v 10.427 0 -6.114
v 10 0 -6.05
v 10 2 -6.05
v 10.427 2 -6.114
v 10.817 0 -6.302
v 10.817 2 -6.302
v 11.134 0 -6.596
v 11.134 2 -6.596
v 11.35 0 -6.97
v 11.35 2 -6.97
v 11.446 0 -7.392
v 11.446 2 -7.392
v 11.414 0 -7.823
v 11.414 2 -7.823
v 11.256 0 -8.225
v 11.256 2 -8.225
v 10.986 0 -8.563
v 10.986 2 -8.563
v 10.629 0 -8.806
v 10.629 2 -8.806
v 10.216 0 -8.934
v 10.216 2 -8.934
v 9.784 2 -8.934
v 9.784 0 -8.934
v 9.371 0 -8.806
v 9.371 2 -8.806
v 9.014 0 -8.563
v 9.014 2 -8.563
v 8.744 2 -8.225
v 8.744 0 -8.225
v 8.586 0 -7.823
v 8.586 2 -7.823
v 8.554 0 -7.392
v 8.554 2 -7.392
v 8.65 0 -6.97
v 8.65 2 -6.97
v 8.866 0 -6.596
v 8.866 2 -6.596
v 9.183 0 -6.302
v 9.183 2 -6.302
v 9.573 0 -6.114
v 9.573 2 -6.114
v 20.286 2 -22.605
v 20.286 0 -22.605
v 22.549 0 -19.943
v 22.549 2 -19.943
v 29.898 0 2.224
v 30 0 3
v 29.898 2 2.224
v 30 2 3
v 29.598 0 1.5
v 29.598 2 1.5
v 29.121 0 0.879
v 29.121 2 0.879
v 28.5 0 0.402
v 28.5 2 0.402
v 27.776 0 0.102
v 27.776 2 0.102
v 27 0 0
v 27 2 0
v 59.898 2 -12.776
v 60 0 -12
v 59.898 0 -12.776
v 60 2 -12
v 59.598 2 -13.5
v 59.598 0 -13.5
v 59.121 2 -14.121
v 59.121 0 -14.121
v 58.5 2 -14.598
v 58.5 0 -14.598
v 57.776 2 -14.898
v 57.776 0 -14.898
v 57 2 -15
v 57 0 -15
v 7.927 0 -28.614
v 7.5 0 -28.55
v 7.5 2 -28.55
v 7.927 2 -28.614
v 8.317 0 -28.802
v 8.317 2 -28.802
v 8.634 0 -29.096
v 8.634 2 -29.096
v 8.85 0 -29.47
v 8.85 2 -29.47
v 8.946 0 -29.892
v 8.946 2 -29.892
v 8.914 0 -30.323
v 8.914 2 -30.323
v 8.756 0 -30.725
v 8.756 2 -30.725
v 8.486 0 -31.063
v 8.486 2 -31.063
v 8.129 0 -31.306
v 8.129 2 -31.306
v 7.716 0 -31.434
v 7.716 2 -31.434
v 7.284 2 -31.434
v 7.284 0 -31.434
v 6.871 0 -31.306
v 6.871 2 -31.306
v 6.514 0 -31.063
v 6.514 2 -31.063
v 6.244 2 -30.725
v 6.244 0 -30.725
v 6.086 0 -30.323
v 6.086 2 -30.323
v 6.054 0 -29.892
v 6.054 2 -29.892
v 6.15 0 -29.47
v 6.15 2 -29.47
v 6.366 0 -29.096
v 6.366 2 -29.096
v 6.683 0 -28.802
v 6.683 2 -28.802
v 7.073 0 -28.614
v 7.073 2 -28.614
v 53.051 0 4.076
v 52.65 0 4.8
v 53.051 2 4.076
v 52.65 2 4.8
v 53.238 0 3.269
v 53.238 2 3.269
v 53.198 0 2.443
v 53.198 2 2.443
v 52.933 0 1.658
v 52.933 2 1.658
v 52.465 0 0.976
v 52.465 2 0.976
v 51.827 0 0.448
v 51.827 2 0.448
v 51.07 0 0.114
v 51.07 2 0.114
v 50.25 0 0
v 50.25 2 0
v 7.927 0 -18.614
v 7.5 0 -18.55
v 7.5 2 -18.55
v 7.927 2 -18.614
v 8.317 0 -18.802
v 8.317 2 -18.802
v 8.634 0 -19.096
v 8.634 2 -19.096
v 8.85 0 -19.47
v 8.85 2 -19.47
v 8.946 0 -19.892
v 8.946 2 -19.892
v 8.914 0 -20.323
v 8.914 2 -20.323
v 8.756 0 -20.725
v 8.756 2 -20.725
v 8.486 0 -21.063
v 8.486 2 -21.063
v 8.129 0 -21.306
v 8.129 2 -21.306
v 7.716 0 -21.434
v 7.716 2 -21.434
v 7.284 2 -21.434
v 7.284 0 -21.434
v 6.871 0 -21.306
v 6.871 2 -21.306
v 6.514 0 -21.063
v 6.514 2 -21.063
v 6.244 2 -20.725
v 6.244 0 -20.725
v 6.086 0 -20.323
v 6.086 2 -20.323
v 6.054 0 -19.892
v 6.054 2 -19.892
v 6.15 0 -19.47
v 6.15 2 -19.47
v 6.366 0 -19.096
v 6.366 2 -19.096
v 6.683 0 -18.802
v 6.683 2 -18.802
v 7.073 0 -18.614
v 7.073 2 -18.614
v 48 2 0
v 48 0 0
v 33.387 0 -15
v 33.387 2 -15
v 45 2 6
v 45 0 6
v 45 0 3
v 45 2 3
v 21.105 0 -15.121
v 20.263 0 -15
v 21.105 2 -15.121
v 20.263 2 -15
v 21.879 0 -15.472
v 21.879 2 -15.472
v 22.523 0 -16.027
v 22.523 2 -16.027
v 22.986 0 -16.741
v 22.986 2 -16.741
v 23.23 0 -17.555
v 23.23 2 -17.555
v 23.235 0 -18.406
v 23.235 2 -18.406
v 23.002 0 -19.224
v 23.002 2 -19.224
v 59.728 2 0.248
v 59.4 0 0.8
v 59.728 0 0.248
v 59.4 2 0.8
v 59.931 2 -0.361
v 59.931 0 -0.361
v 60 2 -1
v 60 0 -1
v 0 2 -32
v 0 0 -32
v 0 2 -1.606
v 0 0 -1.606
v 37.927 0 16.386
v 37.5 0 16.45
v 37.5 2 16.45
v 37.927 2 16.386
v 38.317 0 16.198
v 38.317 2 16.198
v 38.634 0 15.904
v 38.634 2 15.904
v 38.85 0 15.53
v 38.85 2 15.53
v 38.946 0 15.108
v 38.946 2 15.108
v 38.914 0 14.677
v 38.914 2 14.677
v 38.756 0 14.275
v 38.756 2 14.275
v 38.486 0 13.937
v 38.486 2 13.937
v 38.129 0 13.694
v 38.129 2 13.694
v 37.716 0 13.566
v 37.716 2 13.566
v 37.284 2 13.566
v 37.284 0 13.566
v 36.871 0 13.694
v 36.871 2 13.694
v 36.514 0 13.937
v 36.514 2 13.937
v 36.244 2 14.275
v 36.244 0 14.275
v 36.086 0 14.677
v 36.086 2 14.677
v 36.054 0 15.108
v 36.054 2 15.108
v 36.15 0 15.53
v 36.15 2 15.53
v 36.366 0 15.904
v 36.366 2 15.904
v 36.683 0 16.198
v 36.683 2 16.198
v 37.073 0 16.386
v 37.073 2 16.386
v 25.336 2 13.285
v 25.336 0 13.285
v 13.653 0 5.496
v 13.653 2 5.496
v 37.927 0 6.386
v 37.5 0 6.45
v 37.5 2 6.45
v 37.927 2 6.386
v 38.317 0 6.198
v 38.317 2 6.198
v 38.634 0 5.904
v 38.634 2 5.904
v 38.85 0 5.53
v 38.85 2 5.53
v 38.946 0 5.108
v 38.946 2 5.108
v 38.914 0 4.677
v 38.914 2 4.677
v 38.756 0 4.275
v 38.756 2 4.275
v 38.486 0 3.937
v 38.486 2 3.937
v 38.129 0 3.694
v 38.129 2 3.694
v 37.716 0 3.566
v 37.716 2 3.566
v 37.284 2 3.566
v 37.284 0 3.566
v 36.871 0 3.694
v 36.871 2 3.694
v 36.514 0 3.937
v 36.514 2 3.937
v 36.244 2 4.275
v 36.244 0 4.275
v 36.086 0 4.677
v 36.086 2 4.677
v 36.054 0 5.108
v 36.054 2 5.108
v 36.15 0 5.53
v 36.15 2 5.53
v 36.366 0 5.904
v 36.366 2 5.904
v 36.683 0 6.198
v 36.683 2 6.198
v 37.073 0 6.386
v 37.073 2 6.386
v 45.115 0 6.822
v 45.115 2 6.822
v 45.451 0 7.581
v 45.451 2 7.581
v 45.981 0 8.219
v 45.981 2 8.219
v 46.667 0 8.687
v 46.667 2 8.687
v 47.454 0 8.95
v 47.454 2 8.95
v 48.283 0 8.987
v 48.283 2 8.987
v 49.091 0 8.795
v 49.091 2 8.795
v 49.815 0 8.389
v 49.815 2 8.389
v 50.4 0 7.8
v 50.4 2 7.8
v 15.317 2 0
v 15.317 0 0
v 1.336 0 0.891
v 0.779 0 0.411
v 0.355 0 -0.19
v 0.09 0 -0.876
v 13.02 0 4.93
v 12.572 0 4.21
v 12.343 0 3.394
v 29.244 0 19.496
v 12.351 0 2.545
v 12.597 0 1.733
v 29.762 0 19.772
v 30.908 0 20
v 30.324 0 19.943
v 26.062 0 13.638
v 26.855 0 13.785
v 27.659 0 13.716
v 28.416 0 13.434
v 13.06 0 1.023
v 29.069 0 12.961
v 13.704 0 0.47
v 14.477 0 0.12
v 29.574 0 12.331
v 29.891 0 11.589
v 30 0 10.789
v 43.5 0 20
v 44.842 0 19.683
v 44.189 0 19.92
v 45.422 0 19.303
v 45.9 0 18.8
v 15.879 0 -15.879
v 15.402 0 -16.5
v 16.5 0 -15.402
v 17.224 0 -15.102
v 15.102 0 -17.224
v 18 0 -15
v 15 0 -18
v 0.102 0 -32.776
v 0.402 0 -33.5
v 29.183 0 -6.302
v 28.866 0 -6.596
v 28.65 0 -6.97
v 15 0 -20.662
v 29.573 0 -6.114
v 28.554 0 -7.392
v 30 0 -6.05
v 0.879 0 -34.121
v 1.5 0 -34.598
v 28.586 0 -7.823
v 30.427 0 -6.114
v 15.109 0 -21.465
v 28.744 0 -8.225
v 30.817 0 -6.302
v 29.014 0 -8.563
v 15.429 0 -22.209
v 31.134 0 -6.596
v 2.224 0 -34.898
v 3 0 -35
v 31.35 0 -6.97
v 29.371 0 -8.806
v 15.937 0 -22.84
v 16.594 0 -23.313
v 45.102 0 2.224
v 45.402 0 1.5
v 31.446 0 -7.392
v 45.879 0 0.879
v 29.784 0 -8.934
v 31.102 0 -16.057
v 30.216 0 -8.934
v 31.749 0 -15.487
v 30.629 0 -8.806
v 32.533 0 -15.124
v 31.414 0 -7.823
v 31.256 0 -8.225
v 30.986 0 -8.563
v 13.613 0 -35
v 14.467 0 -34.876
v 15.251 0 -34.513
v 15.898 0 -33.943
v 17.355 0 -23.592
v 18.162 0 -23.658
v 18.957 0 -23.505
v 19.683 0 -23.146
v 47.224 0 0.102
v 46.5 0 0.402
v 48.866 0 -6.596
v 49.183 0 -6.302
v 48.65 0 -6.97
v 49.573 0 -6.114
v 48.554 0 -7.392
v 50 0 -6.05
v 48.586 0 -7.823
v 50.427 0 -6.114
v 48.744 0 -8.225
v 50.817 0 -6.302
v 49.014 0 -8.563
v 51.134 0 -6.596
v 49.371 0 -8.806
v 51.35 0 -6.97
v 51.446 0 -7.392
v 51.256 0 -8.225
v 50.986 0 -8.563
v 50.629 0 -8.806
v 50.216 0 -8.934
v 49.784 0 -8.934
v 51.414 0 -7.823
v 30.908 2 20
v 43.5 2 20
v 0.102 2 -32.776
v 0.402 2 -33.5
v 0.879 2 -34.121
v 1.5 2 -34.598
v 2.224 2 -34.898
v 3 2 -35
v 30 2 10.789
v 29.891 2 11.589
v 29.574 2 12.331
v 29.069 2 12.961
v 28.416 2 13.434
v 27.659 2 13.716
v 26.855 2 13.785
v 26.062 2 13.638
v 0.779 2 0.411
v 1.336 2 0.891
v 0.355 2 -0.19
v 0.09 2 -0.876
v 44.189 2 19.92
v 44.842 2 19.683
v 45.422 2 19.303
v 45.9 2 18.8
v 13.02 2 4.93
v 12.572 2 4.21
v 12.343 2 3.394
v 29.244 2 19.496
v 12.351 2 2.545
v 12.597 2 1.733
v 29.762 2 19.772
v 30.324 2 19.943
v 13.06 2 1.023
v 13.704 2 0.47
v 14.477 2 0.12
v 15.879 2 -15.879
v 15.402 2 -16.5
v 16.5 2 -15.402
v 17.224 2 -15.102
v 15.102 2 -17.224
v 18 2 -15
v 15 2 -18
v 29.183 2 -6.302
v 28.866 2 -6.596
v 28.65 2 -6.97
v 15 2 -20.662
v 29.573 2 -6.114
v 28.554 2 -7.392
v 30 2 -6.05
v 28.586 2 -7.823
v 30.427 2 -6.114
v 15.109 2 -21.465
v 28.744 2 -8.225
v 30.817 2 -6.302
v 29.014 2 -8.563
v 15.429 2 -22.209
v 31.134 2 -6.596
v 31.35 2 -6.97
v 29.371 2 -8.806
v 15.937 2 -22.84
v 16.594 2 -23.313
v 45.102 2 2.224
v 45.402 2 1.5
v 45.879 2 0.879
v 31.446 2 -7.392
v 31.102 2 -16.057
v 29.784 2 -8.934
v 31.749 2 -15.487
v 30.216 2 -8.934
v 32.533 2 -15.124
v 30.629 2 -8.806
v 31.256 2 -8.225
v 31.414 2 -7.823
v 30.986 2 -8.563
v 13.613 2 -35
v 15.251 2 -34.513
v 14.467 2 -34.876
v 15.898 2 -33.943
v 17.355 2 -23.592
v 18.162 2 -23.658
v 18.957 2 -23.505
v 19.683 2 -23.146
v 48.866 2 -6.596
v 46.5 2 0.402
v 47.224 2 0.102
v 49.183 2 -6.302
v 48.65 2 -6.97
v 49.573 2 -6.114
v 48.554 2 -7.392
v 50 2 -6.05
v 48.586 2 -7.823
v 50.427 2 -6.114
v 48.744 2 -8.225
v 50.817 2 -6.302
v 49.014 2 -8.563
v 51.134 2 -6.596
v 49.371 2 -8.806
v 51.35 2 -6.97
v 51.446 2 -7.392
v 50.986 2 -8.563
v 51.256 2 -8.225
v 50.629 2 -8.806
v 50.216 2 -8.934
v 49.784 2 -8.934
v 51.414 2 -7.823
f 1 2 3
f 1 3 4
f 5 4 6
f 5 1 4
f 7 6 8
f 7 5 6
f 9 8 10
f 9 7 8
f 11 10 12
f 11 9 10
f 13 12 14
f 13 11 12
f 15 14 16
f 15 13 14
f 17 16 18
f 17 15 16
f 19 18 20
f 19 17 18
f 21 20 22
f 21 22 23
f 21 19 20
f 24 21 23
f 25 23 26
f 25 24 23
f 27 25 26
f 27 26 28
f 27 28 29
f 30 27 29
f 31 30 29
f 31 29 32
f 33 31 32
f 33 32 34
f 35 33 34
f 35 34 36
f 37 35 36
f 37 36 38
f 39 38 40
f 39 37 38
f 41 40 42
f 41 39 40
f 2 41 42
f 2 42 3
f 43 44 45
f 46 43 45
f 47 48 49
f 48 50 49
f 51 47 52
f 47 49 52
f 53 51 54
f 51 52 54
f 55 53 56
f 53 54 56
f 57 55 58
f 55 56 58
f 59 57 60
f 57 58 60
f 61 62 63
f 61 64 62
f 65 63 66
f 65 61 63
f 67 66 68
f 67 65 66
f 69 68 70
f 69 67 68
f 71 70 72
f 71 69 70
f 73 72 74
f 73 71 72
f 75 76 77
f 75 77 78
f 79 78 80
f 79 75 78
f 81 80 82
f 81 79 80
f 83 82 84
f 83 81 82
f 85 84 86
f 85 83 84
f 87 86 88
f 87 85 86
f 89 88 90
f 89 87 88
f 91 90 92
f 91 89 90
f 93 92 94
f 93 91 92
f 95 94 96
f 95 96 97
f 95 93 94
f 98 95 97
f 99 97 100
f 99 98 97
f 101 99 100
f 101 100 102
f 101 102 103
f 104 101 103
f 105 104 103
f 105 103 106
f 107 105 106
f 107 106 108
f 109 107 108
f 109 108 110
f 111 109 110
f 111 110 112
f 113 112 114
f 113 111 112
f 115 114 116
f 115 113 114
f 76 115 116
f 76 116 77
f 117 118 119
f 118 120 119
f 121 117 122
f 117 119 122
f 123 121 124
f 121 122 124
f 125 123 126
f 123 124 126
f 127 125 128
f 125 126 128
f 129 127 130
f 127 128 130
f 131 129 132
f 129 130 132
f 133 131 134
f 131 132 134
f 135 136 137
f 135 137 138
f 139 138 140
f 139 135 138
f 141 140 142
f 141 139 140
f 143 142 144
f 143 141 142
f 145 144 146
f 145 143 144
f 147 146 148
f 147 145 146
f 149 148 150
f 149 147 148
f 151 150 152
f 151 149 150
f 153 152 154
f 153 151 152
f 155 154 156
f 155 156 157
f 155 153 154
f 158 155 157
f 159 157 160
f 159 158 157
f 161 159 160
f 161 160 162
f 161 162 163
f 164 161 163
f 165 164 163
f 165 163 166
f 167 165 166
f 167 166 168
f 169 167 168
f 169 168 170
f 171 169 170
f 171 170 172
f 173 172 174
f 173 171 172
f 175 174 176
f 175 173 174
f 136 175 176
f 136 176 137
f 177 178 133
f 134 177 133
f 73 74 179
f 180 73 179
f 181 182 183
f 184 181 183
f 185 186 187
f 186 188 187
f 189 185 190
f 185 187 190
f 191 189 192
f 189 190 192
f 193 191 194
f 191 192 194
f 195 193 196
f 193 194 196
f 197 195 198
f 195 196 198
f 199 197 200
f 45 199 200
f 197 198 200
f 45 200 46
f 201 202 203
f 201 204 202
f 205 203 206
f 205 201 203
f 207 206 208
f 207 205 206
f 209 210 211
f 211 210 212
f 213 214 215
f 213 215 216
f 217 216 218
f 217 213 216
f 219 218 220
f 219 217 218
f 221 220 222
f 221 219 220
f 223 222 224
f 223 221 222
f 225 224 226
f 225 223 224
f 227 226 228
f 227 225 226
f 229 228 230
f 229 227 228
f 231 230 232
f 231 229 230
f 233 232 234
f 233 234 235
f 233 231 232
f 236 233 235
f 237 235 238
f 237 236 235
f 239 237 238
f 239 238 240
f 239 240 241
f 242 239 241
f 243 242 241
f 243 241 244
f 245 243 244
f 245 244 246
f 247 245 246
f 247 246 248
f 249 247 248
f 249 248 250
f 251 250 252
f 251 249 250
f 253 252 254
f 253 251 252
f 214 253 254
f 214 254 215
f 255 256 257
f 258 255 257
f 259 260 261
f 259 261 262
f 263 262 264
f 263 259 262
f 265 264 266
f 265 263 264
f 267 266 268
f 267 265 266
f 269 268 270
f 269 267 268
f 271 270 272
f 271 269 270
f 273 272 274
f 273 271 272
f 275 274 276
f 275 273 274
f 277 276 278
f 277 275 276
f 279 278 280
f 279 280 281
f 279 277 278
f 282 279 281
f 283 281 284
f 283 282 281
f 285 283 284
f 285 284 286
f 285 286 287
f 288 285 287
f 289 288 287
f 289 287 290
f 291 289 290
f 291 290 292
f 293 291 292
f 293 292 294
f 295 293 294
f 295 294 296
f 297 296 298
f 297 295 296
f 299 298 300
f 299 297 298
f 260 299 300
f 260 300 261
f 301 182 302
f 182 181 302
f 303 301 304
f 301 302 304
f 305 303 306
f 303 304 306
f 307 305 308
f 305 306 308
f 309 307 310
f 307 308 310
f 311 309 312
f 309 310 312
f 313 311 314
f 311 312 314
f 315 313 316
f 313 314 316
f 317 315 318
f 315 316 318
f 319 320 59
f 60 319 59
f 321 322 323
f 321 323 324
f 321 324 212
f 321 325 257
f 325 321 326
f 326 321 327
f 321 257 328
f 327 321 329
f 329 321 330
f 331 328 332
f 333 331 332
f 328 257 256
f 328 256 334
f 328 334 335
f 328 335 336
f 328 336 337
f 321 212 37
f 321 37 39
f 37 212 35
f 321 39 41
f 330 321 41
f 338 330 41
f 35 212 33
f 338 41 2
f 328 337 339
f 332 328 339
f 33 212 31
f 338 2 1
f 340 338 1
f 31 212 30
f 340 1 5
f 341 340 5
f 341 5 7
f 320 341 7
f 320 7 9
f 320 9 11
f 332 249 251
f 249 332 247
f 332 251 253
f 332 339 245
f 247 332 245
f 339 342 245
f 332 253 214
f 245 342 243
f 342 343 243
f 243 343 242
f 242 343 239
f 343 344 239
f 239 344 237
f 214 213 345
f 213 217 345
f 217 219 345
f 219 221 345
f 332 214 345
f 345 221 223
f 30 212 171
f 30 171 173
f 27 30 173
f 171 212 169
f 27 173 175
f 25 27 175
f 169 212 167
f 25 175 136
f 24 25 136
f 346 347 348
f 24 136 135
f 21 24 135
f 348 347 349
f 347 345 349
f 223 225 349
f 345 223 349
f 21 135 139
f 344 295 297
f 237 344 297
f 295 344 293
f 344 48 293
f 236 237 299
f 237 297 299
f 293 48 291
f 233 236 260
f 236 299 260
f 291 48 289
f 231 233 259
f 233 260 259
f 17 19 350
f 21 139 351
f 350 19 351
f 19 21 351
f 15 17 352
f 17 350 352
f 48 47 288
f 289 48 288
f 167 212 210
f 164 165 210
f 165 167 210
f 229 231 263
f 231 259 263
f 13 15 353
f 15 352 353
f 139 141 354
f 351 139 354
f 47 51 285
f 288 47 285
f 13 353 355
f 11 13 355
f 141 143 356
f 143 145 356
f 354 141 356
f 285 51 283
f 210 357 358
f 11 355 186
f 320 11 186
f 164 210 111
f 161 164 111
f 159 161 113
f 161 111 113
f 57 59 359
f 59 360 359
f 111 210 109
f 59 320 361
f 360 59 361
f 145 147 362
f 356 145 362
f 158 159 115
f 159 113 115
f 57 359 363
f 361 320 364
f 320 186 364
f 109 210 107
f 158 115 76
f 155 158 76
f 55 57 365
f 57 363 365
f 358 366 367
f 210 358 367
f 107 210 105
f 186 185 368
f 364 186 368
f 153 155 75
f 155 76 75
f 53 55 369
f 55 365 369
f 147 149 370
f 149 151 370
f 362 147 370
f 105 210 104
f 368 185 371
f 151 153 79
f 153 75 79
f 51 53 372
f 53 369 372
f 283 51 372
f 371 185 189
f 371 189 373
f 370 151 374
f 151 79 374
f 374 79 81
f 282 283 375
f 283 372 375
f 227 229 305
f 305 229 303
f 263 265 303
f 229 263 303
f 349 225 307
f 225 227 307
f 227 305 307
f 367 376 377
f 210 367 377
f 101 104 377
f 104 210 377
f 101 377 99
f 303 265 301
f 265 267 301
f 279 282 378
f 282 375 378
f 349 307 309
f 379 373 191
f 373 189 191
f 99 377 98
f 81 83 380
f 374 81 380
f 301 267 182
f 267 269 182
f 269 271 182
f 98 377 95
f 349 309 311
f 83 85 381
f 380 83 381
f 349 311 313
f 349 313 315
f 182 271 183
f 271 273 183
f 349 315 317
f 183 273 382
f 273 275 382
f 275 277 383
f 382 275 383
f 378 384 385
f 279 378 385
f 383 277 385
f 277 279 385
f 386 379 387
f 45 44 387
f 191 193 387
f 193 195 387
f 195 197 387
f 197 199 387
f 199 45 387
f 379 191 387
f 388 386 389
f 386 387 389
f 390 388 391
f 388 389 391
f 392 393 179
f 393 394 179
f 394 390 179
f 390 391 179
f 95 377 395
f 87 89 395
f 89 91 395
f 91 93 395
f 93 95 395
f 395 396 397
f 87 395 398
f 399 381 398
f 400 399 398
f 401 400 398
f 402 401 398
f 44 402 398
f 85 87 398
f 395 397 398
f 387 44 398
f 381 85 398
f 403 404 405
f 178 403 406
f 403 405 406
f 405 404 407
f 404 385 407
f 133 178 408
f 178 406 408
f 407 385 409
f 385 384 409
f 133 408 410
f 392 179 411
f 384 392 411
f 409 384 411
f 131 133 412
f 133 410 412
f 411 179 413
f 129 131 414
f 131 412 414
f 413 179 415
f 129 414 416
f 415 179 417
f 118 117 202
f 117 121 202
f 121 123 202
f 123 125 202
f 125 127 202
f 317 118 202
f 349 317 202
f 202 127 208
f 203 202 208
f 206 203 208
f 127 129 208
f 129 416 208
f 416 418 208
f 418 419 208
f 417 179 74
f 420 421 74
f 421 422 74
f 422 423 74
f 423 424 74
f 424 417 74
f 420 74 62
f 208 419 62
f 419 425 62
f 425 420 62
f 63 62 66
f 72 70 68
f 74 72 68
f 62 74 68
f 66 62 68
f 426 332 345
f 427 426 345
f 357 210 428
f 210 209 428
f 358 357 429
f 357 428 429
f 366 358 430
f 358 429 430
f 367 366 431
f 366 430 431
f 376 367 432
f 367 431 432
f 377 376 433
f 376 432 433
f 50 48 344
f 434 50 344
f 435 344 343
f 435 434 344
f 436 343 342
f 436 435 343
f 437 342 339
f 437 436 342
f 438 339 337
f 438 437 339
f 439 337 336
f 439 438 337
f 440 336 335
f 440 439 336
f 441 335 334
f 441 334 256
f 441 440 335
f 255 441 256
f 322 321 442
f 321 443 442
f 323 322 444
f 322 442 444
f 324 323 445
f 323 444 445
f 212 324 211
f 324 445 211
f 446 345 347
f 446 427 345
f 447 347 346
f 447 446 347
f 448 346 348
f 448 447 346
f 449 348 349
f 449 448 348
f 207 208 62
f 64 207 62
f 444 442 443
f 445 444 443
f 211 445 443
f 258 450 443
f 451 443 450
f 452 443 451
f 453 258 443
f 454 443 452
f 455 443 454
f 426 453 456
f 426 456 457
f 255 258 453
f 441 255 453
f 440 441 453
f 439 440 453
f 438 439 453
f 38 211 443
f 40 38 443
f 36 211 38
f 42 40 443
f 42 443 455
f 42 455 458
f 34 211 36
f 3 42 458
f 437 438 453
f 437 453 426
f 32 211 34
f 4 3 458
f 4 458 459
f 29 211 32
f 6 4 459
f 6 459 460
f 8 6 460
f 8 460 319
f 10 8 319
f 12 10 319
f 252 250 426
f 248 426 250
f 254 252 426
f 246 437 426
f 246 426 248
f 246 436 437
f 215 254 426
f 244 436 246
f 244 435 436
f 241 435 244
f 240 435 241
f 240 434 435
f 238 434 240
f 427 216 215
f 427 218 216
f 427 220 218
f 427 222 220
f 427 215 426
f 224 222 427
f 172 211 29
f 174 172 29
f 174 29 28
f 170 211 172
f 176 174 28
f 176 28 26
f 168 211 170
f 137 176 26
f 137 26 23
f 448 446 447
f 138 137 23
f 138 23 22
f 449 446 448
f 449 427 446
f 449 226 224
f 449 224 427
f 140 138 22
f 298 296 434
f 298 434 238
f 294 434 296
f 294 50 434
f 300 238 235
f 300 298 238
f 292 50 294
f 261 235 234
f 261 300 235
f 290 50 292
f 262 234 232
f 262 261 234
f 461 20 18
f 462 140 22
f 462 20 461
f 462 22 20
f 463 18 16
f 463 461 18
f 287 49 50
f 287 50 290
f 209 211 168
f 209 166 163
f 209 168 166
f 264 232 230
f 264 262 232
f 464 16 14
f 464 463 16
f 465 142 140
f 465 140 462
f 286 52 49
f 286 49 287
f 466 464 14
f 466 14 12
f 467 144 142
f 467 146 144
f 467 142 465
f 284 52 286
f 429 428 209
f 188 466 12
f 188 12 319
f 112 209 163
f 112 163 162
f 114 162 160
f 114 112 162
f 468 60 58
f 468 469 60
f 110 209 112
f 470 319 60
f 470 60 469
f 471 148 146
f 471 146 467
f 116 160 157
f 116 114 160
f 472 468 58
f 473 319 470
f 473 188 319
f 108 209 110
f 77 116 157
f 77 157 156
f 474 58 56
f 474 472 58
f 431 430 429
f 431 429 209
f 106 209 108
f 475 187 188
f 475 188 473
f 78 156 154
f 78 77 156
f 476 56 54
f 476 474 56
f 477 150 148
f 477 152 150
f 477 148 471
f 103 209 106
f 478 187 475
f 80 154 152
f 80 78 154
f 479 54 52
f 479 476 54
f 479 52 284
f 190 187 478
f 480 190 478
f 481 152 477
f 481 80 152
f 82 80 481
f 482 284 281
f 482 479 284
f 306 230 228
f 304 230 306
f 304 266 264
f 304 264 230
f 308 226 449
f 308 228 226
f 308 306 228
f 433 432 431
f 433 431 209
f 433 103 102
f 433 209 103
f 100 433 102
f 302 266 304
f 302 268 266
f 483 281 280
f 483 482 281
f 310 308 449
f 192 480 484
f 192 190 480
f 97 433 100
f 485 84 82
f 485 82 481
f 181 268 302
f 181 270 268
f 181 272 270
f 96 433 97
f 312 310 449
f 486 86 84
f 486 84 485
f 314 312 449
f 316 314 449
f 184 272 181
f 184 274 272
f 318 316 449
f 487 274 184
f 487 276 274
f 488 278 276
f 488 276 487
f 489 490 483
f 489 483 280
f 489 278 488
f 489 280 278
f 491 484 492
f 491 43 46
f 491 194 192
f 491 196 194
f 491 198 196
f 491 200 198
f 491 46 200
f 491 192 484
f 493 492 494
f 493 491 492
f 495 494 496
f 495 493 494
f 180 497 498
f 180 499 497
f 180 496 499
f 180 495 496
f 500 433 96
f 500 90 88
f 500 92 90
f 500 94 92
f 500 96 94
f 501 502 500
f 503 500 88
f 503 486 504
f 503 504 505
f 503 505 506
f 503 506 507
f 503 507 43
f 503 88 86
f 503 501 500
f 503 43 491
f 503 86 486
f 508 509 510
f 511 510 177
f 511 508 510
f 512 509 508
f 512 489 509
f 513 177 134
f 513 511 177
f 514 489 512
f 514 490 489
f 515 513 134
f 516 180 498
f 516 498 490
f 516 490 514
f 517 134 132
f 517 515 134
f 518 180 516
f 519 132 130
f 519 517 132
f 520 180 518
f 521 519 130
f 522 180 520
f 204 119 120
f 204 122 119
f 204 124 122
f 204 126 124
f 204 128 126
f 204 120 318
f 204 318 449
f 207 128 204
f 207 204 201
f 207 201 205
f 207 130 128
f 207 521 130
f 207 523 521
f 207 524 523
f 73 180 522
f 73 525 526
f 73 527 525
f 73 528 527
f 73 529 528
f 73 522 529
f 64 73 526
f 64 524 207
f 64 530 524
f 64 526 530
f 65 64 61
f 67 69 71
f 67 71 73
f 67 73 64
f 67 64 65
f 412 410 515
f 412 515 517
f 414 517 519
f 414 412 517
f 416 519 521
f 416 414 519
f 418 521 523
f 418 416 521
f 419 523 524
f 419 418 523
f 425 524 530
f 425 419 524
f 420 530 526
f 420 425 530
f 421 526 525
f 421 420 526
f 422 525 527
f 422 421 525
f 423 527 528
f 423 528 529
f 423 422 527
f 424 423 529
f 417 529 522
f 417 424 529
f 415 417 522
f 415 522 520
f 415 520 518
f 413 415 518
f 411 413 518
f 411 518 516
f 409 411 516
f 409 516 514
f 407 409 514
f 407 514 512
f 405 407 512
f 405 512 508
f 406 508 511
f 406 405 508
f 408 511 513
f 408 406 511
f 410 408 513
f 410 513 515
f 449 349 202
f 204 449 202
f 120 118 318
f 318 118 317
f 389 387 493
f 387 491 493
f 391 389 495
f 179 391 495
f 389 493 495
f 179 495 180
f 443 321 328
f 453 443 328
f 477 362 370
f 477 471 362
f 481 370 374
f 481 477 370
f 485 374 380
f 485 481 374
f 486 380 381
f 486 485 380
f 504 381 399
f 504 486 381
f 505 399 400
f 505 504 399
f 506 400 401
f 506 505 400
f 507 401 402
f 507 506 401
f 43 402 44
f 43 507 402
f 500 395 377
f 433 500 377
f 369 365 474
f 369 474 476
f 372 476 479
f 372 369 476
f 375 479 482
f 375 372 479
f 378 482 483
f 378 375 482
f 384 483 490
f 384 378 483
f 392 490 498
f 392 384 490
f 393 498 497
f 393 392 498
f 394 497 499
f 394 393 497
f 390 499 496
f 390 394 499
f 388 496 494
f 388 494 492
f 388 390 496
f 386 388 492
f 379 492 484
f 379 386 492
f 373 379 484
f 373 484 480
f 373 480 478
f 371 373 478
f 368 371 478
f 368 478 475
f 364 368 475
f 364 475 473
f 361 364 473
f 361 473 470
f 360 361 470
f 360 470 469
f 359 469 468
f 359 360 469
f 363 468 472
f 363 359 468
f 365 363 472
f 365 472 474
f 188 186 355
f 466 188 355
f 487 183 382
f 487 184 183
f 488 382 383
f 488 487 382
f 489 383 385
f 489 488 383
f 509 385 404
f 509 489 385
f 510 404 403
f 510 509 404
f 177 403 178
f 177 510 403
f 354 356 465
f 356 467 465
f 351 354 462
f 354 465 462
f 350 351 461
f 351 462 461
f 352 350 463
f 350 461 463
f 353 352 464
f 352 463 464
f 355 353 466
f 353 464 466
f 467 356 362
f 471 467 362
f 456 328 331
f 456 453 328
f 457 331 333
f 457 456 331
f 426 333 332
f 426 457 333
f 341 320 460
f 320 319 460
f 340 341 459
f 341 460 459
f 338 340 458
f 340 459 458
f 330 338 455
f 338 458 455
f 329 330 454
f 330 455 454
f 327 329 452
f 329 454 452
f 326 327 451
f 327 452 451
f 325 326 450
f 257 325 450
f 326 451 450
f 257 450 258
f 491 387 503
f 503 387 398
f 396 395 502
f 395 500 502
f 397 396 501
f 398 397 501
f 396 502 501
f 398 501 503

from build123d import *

# Parameters (mm, degrees)
SKETCH_1_R      = 1.45
EXTRUDE_1_DEPTH = 2
FILLET_1_R      = 3


with BuildPart() as part:
    # 草图1 → 凸台-拉伸1 (new body)
    with BuildSketch(Plane(origin=(0, 0, 0), x_dir=(1, 0, 0), z_dir=(0, 1, 0))):
        Polygon((0, 15), (0, 0), (30, -20), (45, -20), (60, 0), (60, 15), (52.613356649, 15), (45, 15), (32, 15), (15, 35), (0, 35), align=None)
        Polygon((30, -16.394448725), (5.408326913, 0), (30, 0), align=None, mode=Mode.SUBTRACT)
        with Locations(Location((37.5, -15, 0), (0, 0, 270))):
            Circle(SKETCH_1_R, mode=Mode.SUBTRACT)
        Polygon((45, 0), (56.25, 0), (45, -15), align=None, mode=Mode.SUBTRACT)
        with Locations(Location((37.5, -5, 0), (0, 0, 270))):
            Circle(SKETCH_1_R, mode=Mode.SUBTRACT)
        with Locations(Location((10, 7.5, 0), (0, 0, 270))):
            Circle(SKETCH_1_R, mode=Mode.SUBTRACT)
        with Locations(Location((7.5, 20, 0), (0, 0, 270))):
            Circle(SKETCH_1_R, mode=Mode.SUBTRACT)
        with Locations(Location((7.5, 30, 0), (0, 0, 270))):
            Circle(SKETCH_1_R, mode=Mode.SUBTRACT)
        Polygon((15, 28.82380953), (26.750238101, 15), (15, 15), align=None, mode=Mode.SUBTRACT)
        with Locations(Location((30, 7.5, 0), (0, 0, 270))):
            Circle(SKETCH_1_R, mode=Mode.SUBTRACT)
        with Locations(Location((50, 7.5, 0), (0, 0, 270))):
            Circle(SKETCH_1_R, mode=Mode.SUBTRACT)
    extrude(amount=EXTRUDE_1_DEPTH)

    # 圆角1
    fillet_1_edges = [part.edges().sort_by_distance(p)[0] for p in [
        (15, 1, -15),
        (26.750238101, 1, -15),
        (15, 1, -28.82380953),
        (45, 1, 15),
        (56.25, 1, 0),
        (45, 1, 0),
        (30, 1, 0),
        (5.408326913, 1, 0),
        (30, 1, 16.394448725),
        (60, 1, -15),
        (60, 1, 0),
        (45, 1, 20),
        (30, 1, 20),
        (0, 1, 0),
        (0, 1, -35),
        (15, 1, -35),
        (32, 1, -15),
    ]]
    fillet(fillet_1_edges, radius=FILLET_1_R)


solid = part.part
